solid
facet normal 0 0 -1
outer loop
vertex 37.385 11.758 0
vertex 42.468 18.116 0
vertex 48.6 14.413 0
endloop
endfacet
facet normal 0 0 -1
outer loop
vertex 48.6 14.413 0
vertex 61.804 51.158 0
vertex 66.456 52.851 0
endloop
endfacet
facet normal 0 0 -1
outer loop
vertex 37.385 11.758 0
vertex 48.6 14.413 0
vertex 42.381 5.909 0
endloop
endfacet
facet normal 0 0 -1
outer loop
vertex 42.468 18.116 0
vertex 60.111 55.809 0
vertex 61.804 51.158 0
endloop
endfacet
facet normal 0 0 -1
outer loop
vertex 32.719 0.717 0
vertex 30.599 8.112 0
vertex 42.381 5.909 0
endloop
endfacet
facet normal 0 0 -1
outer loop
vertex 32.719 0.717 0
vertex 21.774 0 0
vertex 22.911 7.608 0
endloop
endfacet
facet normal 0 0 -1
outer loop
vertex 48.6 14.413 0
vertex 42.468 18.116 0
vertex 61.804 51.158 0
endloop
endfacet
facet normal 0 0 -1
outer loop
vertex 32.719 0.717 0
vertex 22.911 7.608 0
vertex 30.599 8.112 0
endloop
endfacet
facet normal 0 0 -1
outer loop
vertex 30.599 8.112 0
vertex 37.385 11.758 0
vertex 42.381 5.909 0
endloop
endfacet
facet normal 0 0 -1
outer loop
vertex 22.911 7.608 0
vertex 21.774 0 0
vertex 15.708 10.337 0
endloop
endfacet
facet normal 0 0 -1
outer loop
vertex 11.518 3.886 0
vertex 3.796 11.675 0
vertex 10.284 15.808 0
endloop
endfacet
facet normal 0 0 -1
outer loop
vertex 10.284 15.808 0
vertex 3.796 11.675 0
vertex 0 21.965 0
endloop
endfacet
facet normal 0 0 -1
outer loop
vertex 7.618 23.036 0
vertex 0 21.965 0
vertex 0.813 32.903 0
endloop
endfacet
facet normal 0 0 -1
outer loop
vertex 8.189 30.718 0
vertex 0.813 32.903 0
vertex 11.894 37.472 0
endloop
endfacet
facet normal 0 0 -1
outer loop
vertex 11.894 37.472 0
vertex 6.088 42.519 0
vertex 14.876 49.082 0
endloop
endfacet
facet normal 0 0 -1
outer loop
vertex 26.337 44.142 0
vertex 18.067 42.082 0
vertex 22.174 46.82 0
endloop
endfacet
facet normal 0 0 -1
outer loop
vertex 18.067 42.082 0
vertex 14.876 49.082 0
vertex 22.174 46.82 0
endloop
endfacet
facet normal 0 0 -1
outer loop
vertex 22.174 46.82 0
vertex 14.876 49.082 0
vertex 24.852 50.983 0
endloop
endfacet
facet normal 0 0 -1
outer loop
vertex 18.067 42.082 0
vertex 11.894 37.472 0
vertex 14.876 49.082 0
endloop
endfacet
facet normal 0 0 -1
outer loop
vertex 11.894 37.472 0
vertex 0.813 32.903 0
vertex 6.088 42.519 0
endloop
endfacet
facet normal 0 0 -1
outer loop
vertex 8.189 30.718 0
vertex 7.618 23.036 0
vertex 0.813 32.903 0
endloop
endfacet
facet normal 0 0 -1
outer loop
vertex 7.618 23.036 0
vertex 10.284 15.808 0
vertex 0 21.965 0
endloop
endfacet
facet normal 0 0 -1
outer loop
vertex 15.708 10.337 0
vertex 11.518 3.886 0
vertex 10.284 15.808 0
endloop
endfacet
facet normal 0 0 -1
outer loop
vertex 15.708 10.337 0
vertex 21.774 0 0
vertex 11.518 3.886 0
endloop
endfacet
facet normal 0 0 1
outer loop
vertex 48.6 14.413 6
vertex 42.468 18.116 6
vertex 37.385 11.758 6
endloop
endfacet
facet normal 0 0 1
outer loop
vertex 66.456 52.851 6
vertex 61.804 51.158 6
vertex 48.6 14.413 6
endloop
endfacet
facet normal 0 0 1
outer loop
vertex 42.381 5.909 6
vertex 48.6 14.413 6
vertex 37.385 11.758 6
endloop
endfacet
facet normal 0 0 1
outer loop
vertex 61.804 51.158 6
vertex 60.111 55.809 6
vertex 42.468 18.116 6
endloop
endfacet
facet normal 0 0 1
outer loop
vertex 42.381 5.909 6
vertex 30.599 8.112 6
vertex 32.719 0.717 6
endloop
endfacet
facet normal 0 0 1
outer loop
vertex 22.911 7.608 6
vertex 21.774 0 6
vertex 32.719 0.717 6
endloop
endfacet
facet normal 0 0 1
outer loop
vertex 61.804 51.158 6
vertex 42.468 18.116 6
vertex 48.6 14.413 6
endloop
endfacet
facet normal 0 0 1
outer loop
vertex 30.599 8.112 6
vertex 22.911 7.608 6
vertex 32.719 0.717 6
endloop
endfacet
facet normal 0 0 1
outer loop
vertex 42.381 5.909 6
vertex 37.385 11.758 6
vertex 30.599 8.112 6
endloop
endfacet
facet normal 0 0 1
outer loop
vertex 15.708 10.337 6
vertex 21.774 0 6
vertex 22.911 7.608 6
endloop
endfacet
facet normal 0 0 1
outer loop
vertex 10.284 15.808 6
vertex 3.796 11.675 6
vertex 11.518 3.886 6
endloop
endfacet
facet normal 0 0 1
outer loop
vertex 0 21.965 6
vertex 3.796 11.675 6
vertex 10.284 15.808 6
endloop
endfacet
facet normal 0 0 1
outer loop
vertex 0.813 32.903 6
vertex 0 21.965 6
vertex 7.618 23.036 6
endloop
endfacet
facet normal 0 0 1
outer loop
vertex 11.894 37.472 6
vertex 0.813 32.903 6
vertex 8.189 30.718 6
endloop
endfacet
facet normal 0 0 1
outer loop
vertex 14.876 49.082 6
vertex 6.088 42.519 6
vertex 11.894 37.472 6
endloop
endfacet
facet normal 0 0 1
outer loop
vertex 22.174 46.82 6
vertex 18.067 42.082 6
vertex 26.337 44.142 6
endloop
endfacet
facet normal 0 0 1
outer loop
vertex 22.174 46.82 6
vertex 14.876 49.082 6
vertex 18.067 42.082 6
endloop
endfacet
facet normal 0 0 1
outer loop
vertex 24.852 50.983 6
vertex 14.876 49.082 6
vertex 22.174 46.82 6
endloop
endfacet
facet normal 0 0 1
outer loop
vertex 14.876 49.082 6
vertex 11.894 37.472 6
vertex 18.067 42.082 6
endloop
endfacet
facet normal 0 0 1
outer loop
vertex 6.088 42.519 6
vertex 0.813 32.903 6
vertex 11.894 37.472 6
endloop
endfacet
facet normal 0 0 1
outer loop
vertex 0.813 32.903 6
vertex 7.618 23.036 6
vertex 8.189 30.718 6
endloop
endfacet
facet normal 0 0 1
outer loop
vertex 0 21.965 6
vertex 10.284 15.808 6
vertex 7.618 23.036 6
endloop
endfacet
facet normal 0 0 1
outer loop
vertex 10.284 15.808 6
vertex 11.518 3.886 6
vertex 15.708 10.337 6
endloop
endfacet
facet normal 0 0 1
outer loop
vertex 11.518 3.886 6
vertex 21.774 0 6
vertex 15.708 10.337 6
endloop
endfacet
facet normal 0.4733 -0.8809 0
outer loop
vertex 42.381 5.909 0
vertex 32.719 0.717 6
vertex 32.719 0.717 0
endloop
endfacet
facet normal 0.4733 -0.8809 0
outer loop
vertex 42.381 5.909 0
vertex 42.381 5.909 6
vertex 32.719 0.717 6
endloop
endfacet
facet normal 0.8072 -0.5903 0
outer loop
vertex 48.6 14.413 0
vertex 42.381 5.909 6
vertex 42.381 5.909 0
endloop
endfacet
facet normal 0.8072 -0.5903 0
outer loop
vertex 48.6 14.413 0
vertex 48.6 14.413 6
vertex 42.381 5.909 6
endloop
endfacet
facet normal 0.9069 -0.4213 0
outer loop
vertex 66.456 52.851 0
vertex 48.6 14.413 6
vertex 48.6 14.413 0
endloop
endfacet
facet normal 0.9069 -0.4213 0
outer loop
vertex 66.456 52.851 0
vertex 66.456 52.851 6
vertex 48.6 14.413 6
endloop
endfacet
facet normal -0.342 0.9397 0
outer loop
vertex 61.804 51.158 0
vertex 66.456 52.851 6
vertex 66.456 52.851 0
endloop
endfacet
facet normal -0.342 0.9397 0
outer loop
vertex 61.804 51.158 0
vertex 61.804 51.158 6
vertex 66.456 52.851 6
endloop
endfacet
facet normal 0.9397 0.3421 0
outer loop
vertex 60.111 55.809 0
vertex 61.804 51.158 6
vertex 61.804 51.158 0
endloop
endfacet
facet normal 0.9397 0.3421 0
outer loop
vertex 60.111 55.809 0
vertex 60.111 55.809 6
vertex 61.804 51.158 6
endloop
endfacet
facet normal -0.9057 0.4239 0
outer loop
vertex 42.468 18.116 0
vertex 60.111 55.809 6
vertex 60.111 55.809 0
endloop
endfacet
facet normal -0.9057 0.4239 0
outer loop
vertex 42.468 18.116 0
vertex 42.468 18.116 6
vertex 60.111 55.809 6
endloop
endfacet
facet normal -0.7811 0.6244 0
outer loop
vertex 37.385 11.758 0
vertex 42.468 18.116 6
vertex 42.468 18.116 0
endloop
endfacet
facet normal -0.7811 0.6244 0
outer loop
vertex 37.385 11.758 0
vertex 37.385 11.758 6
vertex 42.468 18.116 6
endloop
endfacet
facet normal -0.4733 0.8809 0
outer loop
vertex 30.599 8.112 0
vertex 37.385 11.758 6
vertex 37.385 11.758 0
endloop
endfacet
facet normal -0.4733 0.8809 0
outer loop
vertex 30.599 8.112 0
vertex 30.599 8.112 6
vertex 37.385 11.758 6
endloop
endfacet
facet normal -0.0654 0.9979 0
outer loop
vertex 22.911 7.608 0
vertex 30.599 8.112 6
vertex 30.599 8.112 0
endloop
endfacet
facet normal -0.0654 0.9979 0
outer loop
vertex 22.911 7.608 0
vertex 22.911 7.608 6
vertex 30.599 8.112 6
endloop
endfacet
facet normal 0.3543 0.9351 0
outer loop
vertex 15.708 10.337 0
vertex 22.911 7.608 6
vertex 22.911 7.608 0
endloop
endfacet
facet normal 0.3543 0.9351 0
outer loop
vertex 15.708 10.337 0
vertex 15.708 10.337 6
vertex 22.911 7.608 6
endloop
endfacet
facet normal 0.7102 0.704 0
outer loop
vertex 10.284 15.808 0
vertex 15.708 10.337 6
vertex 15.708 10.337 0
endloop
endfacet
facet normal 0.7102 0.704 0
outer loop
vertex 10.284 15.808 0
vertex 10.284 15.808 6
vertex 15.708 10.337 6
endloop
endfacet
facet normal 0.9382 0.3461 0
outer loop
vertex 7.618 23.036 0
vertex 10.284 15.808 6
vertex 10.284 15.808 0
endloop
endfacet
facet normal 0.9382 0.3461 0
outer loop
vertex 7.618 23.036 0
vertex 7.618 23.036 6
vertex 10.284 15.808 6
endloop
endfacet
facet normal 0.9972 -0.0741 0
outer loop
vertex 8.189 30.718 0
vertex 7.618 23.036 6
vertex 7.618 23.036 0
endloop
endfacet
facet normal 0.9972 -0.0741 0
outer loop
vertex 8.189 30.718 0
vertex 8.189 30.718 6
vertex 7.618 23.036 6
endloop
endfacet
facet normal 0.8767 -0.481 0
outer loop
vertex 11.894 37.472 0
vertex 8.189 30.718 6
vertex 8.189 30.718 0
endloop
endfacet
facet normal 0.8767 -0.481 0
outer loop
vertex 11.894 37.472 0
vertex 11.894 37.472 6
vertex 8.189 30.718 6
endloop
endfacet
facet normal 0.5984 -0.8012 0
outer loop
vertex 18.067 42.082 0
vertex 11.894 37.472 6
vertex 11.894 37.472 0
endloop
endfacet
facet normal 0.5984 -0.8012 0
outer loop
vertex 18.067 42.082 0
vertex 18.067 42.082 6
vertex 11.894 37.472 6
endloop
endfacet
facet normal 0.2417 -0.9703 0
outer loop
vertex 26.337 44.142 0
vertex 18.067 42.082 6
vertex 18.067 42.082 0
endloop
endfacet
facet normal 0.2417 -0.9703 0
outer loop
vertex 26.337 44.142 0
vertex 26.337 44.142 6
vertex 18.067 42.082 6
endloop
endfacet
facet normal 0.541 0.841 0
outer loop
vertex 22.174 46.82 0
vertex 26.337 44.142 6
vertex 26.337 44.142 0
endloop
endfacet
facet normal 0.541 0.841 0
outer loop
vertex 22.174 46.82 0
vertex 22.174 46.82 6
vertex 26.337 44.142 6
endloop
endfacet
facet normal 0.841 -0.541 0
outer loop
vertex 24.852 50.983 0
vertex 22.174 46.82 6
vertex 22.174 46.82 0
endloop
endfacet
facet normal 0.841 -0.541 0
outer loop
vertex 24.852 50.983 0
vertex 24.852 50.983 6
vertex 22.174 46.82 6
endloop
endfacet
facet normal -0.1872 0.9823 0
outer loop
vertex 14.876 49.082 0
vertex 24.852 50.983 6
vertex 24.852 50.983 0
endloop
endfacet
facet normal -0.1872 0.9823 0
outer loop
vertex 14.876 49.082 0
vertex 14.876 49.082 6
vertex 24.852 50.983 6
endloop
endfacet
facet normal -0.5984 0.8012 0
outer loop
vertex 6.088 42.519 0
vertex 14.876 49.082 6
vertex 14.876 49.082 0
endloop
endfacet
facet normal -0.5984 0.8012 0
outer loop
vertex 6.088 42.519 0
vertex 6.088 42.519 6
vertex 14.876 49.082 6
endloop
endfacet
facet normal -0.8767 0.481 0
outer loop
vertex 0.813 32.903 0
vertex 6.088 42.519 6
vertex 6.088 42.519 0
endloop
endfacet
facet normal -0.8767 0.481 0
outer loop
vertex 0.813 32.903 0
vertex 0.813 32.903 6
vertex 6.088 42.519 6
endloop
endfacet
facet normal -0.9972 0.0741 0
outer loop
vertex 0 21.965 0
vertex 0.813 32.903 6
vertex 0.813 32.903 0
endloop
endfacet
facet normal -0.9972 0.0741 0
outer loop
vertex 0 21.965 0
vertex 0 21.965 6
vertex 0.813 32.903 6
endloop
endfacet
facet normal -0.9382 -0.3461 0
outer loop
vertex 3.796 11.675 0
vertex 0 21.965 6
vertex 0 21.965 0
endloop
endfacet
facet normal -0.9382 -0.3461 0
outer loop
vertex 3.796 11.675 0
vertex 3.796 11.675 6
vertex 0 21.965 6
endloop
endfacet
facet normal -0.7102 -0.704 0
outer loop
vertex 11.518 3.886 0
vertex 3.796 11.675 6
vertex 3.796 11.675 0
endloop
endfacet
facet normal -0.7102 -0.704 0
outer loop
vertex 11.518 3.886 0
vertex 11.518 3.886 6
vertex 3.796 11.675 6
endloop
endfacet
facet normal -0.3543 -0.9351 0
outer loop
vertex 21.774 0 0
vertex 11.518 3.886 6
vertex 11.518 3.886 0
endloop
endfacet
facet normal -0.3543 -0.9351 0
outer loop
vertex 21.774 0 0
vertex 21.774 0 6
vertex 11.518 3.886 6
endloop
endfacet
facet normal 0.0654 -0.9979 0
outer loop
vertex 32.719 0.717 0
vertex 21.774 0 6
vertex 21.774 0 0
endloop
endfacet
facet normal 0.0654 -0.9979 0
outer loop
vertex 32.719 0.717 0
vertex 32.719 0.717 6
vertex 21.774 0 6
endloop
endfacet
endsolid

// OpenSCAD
$fn = 32;

// ----------------------------------------------------------------------
// Hook plate: curl radius 22 mm over 245 degrees, 7 mm thick band
// ----------------------------------------------------------------------

// --- parameters (mm) ---
profile_height = 6;       // extrusion height
profile_points = 26;      // points of the closed outline

profile = [[22.174, 46.82], [24.852, 50.983], [14.876, 49.082], [6.088, 42.519], [0.813, 32.903], [0, 21.965], [3.796, 11.675], [11.518, 3.886], [21.774, 0], [32.719, 0.717], [42.381, 5.909], [48.6, 14.413], [66.456, 52.851], [61.804, 51.158], [60.111, 55.809], [42.468, 18.116], [37.385, 11.758], [30.599, 8.112], [22.911, 7.608], [15.708, 10.337], [10.284, 15.808], [7.618, 23.036], [8.189, 30.718], [11.894, 37.472], [18.067, 42.082], [26.337, 44.142]];  // single closed polygon, 26 points, counter clockwise

// --- the one profile operation ---
linear_extrude(height = profile_height) polygon(points = profile);
